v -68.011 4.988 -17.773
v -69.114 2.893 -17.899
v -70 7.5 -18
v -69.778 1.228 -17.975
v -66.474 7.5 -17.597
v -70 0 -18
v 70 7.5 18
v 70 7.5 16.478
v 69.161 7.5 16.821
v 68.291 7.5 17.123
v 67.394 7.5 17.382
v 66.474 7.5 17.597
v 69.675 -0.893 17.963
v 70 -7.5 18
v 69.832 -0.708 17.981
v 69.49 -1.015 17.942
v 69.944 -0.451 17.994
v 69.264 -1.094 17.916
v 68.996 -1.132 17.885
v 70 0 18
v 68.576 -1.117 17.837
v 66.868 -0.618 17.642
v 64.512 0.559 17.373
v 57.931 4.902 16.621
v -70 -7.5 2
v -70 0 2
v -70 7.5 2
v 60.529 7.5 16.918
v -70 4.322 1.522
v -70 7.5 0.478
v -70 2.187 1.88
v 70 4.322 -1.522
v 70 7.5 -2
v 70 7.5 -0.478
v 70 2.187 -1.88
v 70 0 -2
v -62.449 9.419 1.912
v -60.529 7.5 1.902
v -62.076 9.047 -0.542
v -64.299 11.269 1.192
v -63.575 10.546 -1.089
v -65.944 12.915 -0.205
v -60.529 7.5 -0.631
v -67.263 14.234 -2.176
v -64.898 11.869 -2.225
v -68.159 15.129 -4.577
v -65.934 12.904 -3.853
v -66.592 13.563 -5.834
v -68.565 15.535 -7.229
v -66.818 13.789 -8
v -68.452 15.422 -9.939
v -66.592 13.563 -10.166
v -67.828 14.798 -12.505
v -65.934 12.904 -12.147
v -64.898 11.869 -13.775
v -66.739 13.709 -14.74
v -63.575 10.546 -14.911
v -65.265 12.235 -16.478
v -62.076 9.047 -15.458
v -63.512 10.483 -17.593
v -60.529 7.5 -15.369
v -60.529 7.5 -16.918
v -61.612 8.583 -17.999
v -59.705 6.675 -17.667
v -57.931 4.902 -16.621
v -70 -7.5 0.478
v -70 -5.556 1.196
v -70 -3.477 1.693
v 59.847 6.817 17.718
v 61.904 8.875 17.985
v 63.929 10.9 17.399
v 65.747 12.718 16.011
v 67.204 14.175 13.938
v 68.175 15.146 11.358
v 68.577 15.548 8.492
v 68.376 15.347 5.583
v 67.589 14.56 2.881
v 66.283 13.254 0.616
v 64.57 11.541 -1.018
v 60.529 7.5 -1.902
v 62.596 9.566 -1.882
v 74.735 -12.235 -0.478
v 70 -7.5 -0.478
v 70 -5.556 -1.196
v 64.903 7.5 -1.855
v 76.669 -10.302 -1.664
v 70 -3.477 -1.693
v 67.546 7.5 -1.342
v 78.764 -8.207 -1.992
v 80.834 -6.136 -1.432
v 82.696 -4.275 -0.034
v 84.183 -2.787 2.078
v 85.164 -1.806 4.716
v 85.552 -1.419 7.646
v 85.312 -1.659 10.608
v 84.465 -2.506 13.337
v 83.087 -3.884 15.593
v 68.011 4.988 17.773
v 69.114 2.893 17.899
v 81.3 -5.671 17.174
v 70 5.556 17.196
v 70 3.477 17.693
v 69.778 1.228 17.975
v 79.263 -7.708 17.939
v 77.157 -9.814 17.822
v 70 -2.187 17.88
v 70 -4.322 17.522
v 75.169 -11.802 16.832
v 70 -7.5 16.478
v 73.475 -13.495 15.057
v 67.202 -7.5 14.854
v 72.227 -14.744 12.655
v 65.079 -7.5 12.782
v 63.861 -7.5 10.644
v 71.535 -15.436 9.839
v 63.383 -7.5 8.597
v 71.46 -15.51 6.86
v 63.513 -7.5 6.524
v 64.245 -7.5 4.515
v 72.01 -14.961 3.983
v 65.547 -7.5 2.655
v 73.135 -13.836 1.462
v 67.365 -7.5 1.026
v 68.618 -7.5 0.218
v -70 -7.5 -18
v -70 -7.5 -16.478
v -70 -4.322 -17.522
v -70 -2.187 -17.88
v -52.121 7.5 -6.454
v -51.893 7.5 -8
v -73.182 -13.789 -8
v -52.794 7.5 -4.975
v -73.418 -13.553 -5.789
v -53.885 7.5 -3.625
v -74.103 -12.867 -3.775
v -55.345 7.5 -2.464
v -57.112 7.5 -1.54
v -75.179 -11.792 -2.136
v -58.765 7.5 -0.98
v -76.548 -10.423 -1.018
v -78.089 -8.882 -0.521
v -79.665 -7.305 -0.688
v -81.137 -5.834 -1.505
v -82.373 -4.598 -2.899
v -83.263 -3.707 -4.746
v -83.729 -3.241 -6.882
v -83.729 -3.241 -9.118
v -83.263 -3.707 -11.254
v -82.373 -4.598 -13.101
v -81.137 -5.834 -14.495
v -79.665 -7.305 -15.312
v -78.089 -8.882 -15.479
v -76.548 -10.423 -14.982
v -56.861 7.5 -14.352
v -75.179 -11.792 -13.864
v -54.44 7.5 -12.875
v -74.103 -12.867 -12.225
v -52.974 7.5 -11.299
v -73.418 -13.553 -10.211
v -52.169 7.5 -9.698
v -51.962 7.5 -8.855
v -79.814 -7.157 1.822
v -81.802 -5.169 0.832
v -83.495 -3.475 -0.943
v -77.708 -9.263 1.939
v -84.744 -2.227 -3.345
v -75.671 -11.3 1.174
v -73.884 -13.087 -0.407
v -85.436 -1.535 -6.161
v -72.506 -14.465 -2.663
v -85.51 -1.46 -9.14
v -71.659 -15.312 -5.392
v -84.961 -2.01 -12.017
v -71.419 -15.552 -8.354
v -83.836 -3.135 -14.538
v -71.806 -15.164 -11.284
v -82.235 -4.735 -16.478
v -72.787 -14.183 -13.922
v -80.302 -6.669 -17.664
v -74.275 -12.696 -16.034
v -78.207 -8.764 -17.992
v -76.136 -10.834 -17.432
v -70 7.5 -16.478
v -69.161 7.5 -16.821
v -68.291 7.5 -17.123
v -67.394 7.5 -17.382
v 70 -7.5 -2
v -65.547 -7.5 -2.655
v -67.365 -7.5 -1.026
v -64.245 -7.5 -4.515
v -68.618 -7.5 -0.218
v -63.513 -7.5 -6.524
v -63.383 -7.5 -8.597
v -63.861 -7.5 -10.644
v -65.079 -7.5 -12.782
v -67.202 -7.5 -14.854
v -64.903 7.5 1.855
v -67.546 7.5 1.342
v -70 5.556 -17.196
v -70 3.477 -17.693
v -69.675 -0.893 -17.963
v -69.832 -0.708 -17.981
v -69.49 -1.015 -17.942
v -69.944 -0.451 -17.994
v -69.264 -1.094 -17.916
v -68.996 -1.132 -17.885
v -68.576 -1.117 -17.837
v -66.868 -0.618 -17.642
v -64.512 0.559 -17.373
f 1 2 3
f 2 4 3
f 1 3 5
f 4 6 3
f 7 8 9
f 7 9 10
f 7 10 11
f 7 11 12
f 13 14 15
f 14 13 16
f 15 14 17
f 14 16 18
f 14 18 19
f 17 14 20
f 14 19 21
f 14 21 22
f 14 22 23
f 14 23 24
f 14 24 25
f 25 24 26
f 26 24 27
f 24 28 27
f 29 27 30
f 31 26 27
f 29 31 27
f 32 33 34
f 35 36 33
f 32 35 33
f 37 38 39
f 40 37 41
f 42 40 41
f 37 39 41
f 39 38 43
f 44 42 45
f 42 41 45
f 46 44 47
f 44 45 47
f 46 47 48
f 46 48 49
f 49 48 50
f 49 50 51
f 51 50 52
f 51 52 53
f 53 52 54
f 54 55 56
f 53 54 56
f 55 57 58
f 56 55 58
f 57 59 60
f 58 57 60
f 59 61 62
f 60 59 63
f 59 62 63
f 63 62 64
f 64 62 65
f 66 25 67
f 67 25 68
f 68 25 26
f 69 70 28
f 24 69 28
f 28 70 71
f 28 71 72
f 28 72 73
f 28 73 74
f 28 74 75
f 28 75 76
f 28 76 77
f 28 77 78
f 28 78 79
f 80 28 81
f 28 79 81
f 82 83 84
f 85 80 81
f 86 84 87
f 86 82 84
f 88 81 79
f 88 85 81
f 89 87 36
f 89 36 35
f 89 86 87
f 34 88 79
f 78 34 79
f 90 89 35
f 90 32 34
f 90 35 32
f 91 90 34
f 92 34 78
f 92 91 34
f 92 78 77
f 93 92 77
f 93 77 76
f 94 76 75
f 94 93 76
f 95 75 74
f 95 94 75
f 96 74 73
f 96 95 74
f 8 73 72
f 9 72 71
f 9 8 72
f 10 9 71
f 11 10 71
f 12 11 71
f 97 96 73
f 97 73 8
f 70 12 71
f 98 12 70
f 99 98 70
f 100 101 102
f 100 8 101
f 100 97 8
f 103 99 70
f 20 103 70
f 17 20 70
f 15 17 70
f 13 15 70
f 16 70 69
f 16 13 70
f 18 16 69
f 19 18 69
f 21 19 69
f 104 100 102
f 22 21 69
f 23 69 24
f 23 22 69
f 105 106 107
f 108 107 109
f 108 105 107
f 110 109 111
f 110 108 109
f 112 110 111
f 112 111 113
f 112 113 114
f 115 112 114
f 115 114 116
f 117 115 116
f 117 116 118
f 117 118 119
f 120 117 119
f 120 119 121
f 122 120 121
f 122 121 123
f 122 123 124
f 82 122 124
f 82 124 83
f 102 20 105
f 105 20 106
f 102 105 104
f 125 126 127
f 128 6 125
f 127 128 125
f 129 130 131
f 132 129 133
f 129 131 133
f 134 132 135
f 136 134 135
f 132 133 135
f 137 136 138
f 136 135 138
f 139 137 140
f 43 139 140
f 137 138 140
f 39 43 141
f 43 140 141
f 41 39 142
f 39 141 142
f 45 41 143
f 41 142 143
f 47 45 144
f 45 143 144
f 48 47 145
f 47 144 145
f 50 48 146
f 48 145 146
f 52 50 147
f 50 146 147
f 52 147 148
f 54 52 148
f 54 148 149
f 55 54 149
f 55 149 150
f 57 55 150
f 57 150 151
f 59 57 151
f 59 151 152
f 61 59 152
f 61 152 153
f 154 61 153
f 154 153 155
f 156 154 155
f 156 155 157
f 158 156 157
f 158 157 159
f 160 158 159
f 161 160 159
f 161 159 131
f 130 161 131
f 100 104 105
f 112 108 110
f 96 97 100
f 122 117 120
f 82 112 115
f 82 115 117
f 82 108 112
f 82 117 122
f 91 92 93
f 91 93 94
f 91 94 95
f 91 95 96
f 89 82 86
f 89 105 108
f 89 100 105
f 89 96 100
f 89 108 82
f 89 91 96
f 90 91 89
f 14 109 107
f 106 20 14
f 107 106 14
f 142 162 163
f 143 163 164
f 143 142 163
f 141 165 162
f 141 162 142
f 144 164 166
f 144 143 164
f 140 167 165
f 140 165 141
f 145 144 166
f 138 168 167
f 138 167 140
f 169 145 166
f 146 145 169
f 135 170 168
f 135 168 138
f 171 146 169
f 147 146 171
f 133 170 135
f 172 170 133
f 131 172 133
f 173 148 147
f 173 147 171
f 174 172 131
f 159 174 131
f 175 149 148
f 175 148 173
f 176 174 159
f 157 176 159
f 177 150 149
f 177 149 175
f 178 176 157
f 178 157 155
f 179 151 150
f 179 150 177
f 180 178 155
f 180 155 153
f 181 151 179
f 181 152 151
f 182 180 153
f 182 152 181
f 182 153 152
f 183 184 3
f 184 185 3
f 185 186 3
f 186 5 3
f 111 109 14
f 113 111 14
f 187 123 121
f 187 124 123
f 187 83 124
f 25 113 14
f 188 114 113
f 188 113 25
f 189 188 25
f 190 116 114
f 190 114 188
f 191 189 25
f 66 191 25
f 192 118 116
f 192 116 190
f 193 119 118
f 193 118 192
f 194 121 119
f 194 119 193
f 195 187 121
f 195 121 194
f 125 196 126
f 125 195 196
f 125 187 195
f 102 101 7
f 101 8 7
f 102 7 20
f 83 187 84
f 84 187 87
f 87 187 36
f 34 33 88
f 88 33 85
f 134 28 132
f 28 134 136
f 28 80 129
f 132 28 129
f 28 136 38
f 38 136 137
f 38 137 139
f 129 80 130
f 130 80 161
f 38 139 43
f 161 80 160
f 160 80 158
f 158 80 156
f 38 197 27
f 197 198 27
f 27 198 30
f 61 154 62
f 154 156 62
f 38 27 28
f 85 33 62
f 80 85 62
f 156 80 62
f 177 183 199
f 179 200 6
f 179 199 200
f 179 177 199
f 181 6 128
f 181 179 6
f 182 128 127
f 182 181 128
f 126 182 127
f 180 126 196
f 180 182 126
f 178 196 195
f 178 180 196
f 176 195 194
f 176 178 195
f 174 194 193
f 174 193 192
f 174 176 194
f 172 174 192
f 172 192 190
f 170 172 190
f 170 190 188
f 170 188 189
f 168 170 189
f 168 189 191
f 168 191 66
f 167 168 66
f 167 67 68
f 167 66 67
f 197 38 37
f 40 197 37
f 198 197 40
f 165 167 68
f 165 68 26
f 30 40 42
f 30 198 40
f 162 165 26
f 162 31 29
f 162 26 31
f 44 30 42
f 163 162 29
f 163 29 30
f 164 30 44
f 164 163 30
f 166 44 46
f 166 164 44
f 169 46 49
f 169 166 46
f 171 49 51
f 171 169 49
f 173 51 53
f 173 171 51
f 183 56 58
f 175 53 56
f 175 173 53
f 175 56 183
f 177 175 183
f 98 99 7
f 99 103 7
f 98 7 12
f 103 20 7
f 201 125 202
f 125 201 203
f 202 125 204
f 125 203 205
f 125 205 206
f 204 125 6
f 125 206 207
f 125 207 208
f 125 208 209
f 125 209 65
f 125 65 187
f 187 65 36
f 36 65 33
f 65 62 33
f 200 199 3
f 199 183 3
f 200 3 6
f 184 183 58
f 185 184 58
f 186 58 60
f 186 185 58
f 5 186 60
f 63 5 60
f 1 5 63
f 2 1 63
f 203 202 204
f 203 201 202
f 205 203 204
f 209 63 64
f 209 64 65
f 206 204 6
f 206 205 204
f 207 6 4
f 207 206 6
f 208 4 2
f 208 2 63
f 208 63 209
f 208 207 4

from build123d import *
from build123d.topology import SkipClean

# Parameters (mm, degrees)
BOSS_EXTRUDE1_DEPTH     = 7.5
SKETCH2_R               = 10
BOSS_EXTRUDE2_DEPTH     = 12
SKETCH3_R               = 10
BOSS_EXTRUDE3_DEPTH     = 12
SKETCH4_R               = 7.5
CUT_EXTRUDE1_DEPTH      = 144.04424685
CUT_EXTRUDE1_DEPTH_BACK = 144.04424685


with BuildPart() as part:
    # Sketch1 → Boss-Extrude1 (new, symmetric)
    with BuildSketch(Plane(origin=(0, 0, 0), x_dir=(1, 0, 0), z_dir=(0, 1, 0))):
        Polygon((-70, -2), (-70, 18), (70, 2), (70, -18), align=None)
    extrude(amount=BOSS_EXTRUDE1_DEPTH, both=True)

    # Sketch2 → Boss-Extrude2 (add, symmetric)
    with SkipClean():  # the faces are left unmerged after this step: merging them gives an invalid solid
        with BuildSketch(Plane(origin=(-35, -35, 0), x_dir=(0, 0, 1), z_dir=(-0.7071067811865464, -0.7071067811865488, 0))):
            with Locations(Location((-8, 49.497474683, 0), (0, 0, 147.972239886))):
                Circle(SKETCH2_R)
        extrude(amount=BOSS_EXTRUDE2_DEPTH, both=True)

    # Sketch3 → Boss-Extrude3 (add, symmetric)
    with SkipClean():  # the faces are left unmerged after this step: merging them gives an invalid solid
        with BuildSketch(Plane(origin=(35, -35, 0), x_dir=(0, 0, 1), z_dir=(0.7071067811865512, -0.7071067811865439, 0))):
            with Locations(Location((8, -49.497474683, 0), (0, 0, 147.972239886))):
                Circle(SKETCH3_R)
        extrude(amount=BOSS_EXTRUDE3_DEPTH, both=True)

    # Sketch4 → Cut-Extrude1 (cut, two sides)
    with SkipClean():  # the faces are left unmerged after this step: merging them gives an invalid solid
        with BuildSketch(Plane(origin=(-43.485281374, -43.485281374, 0), x_dir=(0, 0, 1), z_dir=(-0.7071067811865465, -0.7071067811865487, 0))) as cut_extrude1_sk:
            with Locations(Location((-8, 49.497474683, 0), (0, 0, 270))):
                Circle(SKETCH4_R)
        extrude(amount=CUT_EXTRUDE1_DEPTH, mode=Mode.SUBTRACT)
        extrude(cut_extrude1_sk.sketch, amount=-CUT_EXTRUDE1_DEPTH_BACK, mode=Mode.SUBTRACT)


solid = part.part
